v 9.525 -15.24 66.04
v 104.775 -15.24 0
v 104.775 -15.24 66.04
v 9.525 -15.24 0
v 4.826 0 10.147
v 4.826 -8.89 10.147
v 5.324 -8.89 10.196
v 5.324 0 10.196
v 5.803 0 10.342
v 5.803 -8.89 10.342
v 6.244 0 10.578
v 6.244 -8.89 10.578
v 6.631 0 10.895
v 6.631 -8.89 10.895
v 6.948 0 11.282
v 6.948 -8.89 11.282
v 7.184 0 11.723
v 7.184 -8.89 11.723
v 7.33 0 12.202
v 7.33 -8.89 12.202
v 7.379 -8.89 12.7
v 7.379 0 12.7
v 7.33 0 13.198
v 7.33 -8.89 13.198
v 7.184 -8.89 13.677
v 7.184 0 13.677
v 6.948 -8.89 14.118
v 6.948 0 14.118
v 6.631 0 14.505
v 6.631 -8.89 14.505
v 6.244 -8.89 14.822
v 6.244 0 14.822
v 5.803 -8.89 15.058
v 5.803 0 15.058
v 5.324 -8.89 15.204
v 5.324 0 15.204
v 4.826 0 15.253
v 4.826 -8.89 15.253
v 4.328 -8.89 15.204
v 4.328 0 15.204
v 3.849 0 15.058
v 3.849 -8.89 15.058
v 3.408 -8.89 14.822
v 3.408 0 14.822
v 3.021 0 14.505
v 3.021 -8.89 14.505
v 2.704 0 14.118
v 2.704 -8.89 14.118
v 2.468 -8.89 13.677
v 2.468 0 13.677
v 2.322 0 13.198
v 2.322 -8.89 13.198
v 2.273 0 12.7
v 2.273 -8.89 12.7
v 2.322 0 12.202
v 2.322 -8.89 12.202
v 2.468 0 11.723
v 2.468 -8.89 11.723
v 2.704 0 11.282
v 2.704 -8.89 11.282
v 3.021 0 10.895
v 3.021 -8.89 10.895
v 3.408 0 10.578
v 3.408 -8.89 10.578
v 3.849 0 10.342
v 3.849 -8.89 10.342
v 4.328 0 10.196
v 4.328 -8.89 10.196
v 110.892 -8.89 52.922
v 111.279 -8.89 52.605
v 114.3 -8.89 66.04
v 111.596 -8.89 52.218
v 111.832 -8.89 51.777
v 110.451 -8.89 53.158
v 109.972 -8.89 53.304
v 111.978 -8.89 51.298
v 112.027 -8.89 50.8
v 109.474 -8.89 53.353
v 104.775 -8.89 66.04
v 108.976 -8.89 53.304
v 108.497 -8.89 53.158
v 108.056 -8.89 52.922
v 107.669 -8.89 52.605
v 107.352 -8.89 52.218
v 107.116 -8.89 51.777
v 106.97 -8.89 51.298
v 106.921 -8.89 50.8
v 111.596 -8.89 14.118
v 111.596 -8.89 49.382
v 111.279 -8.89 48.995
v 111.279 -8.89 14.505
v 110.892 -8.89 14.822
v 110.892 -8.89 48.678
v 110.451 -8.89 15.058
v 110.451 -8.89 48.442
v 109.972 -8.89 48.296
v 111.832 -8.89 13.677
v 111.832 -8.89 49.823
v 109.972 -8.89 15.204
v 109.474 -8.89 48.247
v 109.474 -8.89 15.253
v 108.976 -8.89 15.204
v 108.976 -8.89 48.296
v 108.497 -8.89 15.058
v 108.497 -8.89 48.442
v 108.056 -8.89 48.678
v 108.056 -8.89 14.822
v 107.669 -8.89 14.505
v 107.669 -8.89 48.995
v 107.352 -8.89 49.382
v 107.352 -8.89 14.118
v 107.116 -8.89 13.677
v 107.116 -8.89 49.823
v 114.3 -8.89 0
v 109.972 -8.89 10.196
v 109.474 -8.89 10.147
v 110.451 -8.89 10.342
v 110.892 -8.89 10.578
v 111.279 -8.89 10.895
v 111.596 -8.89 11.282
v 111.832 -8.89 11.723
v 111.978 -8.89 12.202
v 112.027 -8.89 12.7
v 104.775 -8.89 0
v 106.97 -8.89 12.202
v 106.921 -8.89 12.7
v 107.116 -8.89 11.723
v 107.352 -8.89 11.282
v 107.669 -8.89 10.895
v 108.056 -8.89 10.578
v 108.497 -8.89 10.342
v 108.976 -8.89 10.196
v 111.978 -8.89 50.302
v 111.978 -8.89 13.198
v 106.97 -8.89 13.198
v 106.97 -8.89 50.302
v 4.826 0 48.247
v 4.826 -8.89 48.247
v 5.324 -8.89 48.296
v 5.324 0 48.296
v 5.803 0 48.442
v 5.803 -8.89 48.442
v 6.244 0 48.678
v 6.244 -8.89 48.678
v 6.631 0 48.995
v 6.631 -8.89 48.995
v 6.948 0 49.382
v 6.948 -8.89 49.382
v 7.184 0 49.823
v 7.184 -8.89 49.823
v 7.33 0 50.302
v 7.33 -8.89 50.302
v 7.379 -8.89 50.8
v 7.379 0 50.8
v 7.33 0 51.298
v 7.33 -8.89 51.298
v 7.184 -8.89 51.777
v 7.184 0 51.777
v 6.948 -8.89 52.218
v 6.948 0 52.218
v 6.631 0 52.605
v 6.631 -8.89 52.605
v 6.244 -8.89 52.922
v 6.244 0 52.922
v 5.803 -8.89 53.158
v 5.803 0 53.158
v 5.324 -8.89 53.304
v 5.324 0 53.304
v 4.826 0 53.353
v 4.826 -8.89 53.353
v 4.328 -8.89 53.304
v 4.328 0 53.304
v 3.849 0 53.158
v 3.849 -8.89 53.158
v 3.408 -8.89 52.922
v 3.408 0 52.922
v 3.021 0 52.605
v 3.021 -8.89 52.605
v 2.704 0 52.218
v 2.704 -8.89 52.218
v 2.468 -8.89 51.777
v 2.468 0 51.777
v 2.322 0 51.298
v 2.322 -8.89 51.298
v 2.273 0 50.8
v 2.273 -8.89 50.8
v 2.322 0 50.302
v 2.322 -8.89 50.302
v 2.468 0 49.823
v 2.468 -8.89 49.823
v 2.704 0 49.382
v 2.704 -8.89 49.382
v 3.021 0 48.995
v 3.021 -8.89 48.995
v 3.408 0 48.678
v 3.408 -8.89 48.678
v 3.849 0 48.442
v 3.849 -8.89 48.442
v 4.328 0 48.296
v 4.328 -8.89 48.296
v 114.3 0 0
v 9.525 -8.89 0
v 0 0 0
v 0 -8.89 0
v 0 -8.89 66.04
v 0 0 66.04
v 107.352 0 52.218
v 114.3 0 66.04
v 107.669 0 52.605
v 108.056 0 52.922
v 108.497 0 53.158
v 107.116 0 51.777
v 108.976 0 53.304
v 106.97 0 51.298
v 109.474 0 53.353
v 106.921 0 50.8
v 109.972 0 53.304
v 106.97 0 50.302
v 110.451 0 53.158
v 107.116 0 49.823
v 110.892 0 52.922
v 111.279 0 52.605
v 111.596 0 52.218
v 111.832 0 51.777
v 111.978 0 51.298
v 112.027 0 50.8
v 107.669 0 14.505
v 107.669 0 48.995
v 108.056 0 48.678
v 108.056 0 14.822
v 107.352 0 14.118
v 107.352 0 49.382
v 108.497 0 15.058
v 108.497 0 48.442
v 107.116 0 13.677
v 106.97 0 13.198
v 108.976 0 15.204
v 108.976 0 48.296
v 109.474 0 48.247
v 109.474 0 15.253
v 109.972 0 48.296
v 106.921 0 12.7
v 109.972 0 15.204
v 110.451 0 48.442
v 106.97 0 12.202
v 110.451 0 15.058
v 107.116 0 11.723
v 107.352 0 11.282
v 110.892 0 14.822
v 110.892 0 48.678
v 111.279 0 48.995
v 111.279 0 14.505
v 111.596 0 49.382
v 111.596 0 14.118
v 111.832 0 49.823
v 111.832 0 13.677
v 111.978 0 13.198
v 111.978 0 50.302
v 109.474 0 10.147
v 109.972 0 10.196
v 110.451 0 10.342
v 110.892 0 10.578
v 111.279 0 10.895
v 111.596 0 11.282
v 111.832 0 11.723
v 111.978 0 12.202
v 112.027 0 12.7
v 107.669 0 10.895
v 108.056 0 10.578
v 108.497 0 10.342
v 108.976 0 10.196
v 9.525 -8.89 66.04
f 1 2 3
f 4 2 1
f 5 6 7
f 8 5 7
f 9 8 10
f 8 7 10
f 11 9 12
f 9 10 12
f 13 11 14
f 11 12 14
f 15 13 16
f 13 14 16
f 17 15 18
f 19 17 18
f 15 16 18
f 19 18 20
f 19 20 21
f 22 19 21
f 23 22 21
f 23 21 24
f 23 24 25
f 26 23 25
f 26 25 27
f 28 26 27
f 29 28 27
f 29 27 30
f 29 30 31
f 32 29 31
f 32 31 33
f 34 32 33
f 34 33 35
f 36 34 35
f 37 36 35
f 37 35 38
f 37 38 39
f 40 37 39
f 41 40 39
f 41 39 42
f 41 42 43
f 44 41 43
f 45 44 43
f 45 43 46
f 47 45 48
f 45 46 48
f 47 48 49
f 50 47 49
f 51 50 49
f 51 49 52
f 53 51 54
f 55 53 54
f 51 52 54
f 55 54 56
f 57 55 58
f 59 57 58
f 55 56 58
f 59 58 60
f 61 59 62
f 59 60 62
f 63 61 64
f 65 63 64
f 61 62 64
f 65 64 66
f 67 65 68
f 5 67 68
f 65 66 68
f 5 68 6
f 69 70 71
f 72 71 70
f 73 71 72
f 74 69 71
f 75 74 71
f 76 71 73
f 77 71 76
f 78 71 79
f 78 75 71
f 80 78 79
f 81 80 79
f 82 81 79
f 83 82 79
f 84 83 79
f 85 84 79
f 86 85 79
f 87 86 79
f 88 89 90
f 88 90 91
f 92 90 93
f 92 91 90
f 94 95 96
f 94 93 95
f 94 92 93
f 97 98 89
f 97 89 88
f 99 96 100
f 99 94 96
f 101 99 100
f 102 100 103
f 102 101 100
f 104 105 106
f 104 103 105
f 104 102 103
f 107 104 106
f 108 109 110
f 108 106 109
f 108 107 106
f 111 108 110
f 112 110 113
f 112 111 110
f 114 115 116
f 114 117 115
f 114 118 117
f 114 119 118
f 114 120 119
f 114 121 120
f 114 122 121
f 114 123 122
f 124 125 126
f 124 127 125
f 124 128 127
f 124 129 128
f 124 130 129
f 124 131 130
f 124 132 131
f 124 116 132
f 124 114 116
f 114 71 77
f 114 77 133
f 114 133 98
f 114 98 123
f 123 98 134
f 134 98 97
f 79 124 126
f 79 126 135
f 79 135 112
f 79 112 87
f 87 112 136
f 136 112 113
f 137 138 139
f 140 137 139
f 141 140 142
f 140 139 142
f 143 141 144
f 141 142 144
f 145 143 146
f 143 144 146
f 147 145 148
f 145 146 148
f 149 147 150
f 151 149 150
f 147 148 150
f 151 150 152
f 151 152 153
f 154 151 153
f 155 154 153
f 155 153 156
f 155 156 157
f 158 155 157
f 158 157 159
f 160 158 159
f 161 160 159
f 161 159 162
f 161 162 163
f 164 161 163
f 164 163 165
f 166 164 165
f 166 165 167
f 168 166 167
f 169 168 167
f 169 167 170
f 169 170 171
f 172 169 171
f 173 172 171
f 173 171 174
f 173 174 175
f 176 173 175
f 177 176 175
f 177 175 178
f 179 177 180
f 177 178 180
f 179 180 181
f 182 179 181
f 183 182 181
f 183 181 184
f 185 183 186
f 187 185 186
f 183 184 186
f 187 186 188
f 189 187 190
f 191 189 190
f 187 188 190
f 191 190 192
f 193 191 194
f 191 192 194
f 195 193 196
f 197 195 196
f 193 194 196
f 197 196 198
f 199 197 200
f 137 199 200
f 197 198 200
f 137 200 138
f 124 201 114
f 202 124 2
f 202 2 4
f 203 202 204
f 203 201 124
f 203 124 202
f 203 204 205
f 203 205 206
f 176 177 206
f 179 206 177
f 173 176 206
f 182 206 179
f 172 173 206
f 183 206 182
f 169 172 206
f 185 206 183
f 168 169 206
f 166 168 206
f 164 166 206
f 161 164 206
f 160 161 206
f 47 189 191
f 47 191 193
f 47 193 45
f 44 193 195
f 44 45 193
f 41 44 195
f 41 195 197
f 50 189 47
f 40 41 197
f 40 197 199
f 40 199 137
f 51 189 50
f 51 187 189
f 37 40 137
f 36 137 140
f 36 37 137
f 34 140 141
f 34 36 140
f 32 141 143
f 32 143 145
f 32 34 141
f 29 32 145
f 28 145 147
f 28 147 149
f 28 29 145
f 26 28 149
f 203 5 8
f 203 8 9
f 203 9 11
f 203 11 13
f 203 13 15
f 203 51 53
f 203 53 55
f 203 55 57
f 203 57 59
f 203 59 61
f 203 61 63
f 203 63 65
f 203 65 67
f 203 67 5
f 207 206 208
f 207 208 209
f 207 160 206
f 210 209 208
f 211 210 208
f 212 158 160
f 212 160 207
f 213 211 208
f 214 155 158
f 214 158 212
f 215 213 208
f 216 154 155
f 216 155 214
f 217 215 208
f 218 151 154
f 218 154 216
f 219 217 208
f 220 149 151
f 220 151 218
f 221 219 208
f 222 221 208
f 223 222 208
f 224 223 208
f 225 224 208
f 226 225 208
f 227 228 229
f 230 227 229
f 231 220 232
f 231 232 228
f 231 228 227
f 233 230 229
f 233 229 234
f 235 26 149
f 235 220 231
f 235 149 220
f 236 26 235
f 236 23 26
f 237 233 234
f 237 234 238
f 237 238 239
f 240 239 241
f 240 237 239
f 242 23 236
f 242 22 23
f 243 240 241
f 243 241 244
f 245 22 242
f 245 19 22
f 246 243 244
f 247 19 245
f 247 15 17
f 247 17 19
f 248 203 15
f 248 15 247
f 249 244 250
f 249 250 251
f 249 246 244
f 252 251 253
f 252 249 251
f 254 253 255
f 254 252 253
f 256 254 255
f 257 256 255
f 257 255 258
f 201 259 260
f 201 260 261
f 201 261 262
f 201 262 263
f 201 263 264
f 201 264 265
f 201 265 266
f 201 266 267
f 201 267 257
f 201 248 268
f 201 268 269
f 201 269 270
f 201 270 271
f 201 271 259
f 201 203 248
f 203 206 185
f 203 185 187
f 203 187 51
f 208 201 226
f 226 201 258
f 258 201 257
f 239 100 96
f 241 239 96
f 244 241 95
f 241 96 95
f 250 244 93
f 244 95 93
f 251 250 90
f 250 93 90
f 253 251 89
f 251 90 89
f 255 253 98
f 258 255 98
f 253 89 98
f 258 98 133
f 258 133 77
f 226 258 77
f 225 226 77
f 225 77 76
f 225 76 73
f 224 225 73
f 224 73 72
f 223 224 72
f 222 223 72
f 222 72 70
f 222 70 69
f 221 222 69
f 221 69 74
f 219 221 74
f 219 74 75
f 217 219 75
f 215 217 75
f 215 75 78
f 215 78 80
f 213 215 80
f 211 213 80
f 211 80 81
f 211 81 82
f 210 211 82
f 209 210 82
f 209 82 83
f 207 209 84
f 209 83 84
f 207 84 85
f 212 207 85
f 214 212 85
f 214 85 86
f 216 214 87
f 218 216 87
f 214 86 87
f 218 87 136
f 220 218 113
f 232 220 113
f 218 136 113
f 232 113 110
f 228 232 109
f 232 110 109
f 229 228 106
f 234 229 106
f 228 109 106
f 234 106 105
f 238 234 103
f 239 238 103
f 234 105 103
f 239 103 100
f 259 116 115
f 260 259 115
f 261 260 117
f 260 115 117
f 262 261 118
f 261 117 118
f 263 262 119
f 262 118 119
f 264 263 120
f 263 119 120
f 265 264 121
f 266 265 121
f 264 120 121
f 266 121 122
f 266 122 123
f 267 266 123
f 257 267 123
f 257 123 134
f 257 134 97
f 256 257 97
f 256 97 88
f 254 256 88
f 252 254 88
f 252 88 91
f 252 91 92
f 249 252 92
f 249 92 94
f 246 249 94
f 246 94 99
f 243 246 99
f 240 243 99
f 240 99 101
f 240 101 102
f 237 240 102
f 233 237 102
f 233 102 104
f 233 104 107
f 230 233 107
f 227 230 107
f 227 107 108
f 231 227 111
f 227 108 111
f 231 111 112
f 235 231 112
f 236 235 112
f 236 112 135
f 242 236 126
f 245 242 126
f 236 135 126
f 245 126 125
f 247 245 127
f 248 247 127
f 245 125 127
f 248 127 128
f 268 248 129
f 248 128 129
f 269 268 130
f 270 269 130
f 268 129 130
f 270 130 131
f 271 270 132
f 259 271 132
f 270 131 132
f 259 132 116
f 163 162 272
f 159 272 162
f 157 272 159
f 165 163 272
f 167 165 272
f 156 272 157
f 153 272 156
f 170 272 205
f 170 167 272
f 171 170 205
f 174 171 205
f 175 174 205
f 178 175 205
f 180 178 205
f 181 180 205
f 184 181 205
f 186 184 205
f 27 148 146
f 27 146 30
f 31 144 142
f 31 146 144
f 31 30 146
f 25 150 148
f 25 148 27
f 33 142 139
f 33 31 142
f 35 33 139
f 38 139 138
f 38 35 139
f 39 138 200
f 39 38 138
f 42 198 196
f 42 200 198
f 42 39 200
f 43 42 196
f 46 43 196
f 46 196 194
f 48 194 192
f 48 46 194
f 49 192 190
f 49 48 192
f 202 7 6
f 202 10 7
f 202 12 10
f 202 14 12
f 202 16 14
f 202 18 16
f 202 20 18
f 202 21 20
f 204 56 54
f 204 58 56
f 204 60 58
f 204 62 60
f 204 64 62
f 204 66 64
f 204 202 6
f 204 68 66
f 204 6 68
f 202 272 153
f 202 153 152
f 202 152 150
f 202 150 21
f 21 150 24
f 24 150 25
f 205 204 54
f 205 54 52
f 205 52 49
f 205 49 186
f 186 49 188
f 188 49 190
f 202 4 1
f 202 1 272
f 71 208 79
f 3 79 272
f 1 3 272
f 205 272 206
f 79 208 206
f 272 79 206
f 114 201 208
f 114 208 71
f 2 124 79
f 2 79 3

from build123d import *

# Parameters (mm, degrees)
BOSS_EXTRUDE1_DEPTH    = 66.04
F_10_CLEARANCE_HOLE1_D = 5.1054


with BuildPart() as part:
    # Sketch2 → Boss-Extrude1 (new body)
    with BuildSketch(Plane.XY):
        Polygon((0, 0), (114.3, 0), (114.3, -8.89), (104.775, -8.89), (104.775, -15.24), (9.525, -15.24), (9.525, -8.89), (0, -8.89), align=None)
    extrude(amount=BOSS_EXTRUDE1_DEPTH)

    # #10 Clearance Hole1 (through all)
    with Locations(Plane(origin=(4.826, 0, 12.7), x_dir=(0, 0, 1), z_dir=(0, 1, 0))):
        with Locations((0, 0), (38.1, 0), (38.1, 104.648), (0, 104.648)):
            Hole(F_10_CLEARANCE_HOLE1_D / 2)


solid = part.part
